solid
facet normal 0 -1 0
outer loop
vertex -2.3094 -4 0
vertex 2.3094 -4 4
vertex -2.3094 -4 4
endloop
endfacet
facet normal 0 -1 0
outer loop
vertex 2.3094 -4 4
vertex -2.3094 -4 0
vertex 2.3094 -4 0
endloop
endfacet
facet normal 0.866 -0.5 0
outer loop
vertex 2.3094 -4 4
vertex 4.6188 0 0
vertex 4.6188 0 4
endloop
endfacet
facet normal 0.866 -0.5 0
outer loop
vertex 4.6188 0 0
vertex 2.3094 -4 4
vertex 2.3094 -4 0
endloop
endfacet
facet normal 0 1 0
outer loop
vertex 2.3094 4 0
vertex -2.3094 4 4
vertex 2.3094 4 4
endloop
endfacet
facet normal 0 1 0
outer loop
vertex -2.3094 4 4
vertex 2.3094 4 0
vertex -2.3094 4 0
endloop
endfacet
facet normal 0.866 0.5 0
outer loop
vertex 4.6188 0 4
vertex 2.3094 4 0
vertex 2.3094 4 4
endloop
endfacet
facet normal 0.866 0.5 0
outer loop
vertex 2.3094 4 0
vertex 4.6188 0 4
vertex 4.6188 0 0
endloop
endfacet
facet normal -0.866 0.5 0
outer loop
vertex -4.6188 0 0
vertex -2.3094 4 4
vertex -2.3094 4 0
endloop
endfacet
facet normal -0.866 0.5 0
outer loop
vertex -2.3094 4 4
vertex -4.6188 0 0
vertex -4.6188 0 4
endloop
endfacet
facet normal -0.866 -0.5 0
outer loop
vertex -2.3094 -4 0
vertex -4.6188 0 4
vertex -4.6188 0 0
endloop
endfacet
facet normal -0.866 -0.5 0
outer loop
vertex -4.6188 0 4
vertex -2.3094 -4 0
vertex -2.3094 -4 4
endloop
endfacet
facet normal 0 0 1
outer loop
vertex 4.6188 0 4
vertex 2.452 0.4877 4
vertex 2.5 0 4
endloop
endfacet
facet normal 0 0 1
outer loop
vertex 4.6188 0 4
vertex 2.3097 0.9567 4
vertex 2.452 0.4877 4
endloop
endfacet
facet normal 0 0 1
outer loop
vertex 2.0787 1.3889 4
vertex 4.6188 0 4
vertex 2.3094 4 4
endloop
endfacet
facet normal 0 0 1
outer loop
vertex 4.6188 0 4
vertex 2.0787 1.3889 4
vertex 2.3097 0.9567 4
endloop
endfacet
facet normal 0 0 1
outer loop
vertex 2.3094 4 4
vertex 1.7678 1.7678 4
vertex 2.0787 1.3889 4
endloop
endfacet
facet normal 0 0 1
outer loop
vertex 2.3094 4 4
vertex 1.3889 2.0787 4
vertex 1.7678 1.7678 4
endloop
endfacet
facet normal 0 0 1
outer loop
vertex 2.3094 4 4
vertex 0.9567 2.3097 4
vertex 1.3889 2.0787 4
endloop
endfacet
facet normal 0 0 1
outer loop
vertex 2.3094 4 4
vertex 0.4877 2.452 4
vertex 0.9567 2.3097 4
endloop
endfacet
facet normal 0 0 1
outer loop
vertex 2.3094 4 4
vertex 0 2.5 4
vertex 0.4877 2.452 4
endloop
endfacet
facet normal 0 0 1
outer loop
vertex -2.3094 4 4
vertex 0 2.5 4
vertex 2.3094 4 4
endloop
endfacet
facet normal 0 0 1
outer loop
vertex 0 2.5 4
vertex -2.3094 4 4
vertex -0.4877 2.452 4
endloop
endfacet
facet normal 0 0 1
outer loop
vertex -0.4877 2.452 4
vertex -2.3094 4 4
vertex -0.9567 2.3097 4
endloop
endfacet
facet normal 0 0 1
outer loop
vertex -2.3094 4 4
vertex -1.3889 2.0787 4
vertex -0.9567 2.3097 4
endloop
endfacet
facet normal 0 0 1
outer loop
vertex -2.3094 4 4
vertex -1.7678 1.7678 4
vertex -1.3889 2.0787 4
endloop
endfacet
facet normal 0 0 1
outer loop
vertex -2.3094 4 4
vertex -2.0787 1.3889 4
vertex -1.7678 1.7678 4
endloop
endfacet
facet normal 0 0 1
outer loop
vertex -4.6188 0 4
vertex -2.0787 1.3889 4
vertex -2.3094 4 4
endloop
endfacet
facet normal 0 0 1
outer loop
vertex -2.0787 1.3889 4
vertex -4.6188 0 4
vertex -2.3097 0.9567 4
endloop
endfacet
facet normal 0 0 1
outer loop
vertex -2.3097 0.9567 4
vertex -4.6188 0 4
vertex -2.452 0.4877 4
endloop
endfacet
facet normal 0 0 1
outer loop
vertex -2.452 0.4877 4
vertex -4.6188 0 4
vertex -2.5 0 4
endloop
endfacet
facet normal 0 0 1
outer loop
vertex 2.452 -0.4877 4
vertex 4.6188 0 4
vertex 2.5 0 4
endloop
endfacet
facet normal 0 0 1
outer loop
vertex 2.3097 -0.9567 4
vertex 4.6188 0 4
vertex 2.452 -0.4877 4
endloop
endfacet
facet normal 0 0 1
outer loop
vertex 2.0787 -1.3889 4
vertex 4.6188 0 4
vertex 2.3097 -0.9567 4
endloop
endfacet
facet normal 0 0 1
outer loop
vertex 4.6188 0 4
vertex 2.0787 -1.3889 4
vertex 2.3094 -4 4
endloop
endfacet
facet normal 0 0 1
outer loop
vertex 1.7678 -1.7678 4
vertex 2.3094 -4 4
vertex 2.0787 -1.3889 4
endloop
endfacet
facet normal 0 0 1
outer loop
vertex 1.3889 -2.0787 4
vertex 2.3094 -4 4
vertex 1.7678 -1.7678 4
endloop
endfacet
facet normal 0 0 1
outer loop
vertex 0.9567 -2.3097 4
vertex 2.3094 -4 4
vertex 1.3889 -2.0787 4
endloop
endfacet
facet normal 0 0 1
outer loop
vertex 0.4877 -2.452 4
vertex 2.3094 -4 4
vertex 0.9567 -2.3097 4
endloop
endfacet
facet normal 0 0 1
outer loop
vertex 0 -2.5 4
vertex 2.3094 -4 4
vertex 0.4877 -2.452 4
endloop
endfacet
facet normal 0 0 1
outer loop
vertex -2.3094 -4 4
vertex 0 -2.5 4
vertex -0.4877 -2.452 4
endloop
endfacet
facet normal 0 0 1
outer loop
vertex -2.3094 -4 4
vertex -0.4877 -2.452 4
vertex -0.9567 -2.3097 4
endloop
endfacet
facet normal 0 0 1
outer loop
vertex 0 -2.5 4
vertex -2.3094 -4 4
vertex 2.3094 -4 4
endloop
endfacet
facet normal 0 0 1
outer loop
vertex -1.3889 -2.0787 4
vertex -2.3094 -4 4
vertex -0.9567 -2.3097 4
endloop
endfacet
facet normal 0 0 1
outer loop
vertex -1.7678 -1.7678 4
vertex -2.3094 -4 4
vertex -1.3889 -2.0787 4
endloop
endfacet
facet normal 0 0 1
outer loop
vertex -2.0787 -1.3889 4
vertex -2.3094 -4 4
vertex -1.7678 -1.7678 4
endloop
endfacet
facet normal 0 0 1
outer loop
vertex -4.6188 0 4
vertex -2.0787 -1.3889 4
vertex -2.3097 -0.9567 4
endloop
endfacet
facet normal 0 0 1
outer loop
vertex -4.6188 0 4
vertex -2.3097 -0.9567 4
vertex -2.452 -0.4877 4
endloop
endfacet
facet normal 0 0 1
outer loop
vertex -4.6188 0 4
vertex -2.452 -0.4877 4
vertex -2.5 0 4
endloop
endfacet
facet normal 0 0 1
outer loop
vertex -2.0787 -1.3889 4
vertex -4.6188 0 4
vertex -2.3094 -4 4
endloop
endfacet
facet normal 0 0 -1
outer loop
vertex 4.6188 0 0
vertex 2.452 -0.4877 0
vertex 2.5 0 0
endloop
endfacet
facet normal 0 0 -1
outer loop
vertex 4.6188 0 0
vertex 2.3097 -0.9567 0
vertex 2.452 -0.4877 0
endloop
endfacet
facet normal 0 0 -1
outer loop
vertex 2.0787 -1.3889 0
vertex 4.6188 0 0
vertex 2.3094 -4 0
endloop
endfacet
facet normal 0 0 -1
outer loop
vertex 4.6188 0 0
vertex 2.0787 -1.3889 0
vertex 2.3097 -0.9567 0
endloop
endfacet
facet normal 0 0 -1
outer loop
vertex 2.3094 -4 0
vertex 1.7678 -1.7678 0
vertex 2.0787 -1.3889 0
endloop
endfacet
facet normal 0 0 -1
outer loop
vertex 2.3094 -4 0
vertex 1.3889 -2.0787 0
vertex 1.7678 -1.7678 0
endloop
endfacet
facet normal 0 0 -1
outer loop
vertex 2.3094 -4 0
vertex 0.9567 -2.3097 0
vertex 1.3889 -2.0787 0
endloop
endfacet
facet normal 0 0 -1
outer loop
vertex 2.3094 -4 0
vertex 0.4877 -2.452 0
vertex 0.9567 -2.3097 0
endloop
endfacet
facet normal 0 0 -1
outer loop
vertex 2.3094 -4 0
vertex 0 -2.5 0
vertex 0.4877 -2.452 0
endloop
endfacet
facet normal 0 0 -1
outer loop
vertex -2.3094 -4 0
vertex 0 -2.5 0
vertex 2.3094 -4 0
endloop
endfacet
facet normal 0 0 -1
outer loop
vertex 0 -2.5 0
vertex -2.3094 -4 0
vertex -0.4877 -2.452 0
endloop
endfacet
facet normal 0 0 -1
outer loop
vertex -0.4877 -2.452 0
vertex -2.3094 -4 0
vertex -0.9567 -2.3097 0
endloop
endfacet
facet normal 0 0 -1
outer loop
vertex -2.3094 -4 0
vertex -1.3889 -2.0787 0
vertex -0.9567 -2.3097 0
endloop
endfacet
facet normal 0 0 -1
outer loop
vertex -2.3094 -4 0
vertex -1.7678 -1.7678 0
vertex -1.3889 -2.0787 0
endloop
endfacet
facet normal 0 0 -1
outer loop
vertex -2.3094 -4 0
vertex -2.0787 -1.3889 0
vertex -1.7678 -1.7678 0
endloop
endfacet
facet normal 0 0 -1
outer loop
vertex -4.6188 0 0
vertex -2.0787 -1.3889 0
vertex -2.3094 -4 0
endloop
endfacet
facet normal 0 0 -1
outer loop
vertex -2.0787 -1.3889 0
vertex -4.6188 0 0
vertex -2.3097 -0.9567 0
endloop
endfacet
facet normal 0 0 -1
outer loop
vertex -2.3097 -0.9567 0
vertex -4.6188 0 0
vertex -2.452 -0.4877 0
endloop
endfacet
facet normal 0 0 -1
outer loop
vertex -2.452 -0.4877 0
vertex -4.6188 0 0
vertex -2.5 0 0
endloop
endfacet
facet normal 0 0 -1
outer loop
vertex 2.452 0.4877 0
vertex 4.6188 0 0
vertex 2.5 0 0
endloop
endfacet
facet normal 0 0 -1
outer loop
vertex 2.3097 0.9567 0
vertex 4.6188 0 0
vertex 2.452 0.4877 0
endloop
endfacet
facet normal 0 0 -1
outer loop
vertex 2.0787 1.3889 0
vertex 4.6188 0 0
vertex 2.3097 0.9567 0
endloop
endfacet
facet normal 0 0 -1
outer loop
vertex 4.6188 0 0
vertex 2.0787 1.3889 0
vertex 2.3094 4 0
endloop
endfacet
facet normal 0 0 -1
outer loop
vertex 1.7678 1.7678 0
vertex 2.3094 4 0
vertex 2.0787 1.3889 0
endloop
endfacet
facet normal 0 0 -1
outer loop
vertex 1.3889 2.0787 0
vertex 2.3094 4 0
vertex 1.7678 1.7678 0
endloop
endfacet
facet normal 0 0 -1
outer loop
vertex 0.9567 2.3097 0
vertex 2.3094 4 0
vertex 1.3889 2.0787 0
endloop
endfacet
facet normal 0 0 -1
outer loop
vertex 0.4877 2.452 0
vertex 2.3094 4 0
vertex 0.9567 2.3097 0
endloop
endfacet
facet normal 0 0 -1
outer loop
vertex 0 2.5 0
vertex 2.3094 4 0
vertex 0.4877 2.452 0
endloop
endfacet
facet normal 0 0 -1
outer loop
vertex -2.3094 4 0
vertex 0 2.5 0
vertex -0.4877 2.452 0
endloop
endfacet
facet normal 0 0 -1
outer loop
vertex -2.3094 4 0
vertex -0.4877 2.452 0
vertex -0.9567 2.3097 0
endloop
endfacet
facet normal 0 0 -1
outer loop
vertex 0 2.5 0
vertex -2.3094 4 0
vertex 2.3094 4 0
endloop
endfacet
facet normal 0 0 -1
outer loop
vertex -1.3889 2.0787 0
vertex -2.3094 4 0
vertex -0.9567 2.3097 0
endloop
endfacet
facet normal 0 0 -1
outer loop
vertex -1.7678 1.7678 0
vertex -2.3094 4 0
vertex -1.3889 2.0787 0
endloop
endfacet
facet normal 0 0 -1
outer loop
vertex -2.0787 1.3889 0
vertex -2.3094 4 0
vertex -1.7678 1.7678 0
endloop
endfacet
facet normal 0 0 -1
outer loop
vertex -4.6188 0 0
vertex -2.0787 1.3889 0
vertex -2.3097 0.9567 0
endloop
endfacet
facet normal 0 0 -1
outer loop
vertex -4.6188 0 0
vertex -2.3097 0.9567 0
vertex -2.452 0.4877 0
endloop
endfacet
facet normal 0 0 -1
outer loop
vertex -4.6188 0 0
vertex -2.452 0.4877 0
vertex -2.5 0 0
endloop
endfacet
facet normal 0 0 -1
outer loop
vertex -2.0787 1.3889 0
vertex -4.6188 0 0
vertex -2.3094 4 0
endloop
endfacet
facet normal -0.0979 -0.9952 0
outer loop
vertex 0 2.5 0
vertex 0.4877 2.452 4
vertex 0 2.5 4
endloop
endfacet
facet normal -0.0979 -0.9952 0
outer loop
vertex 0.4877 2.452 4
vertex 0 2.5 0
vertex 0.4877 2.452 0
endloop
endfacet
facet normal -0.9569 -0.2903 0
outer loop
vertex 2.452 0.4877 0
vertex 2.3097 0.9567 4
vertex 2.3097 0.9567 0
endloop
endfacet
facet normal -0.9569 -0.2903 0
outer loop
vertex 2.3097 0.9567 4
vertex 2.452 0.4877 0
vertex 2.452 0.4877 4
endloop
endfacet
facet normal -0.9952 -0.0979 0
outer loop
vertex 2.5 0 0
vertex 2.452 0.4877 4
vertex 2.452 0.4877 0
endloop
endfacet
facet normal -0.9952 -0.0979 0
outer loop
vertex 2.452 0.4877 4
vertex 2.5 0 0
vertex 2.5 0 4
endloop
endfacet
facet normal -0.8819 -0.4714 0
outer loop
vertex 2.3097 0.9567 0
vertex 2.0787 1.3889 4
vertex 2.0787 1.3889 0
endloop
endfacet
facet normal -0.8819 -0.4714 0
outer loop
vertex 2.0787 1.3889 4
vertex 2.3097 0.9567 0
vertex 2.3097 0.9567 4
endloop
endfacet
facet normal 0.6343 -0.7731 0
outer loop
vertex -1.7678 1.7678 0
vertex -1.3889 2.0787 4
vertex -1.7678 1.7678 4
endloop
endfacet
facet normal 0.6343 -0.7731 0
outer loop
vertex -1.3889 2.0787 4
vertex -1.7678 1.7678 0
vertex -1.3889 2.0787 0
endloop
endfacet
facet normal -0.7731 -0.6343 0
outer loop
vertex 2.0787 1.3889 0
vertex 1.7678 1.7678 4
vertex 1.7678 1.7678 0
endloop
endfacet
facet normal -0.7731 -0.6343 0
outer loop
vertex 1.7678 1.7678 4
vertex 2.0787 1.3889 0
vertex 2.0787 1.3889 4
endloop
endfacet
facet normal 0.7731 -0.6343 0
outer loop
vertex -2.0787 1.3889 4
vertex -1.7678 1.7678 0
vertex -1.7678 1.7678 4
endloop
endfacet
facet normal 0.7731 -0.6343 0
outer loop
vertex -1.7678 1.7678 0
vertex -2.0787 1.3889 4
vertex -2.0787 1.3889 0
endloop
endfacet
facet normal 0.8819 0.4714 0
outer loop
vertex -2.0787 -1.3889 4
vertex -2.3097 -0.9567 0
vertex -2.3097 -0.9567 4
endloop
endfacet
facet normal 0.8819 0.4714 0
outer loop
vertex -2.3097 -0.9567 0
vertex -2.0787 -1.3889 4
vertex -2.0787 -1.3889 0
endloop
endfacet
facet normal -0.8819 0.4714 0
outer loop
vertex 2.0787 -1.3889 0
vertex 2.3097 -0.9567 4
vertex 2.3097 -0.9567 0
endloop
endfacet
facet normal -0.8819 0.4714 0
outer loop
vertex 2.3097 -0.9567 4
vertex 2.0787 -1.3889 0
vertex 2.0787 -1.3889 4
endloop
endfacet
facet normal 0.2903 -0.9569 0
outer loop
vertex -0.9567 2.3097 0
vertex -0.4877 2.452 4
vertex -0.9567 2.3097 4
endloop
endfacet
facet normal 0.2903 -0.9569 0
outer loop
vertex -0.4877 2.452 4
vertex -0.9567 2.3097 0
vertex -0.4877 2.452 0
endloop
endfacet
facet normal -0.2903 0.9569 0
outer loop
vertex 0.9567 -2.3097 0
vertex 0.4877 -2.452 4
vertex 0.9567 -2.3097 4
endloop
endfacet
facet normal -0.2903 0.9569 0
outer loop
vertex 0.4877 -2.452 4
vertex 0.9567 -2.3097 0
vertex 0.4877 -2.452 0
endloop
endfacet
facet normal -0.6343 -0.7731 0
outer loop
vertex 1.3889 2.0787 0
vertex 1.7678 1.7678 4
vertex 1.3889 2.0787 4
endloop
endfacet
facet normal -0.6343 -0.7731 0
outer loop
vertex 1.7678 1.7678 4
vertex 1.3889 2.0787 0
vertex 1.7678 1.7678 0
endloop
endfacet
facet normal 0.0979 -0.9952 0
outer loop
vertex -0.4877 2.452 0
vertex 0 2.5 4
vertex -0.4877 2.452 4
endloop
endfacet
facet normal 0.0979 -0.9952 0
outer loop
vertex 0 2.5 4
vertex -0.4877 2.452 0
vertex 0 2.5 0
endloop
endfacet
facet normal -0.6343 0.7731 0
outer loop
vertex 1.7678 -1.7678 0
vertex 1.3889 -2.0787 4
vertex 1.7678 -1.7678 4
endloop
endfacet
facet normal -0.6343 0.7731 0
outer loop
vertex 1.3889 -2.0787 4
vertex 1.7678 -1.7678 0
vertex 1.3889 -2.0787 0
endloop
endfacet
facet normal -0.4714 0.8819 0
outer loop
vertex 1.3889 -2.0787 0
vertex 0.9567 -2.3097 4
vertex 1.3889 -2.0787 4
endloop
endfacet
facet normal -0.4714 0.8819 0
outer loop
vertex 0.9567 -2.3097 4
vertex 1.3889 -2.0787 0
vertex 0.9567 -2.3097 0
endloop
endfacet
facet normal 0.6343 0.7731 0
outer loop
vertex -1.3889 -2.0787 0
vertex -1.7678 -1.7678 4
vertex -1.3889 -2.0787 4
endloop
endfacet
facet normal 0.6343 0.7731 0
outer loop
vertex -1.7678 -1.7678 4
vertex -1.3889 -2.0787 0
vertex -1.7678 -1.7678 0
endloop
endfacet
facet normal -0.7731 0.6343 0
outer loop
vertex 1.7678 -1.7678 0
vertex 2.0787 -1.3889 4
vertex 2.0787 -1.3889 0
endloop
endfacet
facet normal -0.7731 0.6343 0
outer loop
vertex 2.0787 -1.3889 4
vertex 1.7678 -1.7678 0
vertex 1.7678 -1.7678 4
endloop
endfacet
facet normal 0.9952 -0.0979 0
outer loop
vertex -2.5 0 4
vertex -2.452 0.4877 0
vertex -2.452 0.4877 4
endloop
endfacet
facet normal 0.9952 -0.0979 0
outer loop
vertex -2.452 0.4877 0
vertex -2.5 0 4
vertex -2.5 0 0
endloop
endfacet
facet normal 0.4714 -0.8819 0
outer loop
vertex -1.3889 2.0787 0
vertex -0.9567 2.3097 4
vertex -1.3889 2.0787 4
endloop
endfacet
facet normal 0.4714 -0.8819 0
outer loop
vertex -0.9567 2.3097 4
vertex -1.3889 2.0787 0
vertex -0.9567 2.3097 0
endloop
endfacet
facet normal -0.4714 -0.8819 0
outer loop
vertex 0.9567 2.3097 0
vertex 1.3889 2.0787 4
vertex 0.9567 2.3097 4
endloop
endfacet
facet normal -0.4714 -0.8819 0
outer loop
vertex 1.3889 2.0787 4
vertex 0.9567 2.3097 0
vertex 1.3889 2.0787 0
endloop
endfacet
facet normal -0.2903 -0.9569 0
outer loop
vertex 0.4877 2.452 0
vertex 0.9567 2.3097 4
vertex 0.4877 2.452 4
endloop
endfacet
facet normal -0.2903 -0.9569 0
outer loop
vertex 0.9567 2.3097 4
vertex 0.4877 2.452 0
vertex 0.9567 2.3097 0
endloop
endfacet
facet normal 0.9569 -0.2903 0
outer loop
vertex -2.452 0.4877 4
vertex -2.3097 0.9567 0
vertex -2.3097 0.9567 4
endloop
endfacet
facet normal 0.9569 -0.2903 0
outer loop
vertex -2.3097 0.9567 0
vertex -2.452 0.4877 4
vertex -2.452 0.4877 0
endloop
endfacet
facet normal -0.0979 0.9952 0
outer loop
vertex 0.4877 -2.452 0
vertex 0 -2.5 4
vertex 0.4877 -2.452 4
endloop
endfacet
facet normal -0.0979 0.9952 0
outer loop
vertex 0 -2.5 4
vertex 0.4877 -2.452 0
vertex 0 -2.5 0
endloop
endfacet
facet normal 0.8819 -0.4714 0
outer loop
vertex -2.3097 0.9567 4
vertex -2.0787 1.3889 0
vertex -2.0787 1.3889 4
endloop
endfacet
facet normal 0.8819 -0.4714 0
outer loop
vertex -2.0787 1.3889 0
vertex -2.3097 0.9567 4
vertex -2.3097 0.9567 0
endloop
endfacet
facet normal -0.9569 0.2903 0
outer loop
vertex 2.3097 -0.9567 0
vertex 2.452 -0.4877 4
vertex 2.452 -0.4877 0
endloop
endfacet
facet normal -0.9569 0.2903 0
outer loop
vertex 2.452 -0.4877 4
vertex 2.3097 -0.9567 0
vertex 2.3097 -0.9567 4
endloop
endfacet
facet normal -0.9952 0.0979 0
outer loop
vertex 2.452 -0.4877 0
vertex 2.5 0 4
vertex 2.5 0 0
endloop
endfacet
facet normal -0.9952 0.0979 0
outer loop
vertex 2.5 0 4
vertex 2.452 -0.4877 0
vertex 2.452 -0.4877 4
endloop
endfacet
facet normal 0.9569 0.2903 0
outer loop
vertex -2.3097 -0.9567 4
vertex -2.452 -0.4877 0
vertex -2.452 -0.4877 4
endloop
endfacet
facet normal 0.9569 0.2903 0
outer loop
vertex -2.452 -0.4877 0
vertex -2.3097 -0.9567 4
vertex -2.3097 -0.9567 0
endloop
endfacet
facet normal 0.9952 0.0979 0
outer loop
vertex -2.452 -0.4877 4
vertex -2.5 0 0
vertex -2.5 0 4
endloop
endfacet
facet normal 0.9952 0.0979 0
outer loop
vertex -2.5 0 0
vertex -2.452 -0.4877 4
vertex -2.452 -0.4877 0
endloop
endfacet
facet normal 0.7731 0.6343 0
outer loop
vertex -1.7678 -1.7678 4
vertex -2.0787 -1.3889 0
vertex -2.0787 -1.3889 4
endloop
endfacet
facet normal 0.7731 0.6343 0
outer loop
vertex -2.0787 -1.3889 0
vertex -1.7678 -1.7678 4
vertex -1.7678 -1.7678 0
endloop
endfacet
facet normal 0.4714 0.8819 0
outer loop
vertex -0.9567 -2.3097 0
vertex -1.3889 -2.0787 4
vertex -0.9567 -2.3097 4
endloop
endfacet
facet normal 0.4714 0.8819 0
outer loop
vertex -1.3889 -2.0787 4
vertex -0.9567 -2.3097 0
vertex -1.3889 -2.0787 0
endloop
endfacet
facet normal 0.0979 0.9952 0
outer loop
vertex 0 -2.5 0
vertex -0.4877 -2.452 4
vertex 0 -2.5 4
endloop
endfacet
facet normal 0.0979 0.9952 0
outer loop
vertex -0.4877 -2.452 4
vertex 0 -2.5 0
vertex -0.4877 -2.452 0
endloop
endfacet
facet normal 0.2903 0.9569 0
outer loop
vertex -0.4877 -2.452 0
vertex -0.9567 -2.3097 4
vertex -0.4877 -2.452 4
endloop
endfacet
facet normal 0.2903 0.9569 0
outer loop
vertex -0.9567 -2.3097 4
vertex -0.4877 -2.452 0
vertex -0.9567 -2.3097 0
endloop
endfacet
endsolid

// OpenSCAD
// Purchased hardware envelope; no modeled threads, not print.
$fn=32;
difference(){cylinder(d=8/cos(30),h=4,$fn=6);translate([0,0,-1])cylinder(d=5,h=6);}
